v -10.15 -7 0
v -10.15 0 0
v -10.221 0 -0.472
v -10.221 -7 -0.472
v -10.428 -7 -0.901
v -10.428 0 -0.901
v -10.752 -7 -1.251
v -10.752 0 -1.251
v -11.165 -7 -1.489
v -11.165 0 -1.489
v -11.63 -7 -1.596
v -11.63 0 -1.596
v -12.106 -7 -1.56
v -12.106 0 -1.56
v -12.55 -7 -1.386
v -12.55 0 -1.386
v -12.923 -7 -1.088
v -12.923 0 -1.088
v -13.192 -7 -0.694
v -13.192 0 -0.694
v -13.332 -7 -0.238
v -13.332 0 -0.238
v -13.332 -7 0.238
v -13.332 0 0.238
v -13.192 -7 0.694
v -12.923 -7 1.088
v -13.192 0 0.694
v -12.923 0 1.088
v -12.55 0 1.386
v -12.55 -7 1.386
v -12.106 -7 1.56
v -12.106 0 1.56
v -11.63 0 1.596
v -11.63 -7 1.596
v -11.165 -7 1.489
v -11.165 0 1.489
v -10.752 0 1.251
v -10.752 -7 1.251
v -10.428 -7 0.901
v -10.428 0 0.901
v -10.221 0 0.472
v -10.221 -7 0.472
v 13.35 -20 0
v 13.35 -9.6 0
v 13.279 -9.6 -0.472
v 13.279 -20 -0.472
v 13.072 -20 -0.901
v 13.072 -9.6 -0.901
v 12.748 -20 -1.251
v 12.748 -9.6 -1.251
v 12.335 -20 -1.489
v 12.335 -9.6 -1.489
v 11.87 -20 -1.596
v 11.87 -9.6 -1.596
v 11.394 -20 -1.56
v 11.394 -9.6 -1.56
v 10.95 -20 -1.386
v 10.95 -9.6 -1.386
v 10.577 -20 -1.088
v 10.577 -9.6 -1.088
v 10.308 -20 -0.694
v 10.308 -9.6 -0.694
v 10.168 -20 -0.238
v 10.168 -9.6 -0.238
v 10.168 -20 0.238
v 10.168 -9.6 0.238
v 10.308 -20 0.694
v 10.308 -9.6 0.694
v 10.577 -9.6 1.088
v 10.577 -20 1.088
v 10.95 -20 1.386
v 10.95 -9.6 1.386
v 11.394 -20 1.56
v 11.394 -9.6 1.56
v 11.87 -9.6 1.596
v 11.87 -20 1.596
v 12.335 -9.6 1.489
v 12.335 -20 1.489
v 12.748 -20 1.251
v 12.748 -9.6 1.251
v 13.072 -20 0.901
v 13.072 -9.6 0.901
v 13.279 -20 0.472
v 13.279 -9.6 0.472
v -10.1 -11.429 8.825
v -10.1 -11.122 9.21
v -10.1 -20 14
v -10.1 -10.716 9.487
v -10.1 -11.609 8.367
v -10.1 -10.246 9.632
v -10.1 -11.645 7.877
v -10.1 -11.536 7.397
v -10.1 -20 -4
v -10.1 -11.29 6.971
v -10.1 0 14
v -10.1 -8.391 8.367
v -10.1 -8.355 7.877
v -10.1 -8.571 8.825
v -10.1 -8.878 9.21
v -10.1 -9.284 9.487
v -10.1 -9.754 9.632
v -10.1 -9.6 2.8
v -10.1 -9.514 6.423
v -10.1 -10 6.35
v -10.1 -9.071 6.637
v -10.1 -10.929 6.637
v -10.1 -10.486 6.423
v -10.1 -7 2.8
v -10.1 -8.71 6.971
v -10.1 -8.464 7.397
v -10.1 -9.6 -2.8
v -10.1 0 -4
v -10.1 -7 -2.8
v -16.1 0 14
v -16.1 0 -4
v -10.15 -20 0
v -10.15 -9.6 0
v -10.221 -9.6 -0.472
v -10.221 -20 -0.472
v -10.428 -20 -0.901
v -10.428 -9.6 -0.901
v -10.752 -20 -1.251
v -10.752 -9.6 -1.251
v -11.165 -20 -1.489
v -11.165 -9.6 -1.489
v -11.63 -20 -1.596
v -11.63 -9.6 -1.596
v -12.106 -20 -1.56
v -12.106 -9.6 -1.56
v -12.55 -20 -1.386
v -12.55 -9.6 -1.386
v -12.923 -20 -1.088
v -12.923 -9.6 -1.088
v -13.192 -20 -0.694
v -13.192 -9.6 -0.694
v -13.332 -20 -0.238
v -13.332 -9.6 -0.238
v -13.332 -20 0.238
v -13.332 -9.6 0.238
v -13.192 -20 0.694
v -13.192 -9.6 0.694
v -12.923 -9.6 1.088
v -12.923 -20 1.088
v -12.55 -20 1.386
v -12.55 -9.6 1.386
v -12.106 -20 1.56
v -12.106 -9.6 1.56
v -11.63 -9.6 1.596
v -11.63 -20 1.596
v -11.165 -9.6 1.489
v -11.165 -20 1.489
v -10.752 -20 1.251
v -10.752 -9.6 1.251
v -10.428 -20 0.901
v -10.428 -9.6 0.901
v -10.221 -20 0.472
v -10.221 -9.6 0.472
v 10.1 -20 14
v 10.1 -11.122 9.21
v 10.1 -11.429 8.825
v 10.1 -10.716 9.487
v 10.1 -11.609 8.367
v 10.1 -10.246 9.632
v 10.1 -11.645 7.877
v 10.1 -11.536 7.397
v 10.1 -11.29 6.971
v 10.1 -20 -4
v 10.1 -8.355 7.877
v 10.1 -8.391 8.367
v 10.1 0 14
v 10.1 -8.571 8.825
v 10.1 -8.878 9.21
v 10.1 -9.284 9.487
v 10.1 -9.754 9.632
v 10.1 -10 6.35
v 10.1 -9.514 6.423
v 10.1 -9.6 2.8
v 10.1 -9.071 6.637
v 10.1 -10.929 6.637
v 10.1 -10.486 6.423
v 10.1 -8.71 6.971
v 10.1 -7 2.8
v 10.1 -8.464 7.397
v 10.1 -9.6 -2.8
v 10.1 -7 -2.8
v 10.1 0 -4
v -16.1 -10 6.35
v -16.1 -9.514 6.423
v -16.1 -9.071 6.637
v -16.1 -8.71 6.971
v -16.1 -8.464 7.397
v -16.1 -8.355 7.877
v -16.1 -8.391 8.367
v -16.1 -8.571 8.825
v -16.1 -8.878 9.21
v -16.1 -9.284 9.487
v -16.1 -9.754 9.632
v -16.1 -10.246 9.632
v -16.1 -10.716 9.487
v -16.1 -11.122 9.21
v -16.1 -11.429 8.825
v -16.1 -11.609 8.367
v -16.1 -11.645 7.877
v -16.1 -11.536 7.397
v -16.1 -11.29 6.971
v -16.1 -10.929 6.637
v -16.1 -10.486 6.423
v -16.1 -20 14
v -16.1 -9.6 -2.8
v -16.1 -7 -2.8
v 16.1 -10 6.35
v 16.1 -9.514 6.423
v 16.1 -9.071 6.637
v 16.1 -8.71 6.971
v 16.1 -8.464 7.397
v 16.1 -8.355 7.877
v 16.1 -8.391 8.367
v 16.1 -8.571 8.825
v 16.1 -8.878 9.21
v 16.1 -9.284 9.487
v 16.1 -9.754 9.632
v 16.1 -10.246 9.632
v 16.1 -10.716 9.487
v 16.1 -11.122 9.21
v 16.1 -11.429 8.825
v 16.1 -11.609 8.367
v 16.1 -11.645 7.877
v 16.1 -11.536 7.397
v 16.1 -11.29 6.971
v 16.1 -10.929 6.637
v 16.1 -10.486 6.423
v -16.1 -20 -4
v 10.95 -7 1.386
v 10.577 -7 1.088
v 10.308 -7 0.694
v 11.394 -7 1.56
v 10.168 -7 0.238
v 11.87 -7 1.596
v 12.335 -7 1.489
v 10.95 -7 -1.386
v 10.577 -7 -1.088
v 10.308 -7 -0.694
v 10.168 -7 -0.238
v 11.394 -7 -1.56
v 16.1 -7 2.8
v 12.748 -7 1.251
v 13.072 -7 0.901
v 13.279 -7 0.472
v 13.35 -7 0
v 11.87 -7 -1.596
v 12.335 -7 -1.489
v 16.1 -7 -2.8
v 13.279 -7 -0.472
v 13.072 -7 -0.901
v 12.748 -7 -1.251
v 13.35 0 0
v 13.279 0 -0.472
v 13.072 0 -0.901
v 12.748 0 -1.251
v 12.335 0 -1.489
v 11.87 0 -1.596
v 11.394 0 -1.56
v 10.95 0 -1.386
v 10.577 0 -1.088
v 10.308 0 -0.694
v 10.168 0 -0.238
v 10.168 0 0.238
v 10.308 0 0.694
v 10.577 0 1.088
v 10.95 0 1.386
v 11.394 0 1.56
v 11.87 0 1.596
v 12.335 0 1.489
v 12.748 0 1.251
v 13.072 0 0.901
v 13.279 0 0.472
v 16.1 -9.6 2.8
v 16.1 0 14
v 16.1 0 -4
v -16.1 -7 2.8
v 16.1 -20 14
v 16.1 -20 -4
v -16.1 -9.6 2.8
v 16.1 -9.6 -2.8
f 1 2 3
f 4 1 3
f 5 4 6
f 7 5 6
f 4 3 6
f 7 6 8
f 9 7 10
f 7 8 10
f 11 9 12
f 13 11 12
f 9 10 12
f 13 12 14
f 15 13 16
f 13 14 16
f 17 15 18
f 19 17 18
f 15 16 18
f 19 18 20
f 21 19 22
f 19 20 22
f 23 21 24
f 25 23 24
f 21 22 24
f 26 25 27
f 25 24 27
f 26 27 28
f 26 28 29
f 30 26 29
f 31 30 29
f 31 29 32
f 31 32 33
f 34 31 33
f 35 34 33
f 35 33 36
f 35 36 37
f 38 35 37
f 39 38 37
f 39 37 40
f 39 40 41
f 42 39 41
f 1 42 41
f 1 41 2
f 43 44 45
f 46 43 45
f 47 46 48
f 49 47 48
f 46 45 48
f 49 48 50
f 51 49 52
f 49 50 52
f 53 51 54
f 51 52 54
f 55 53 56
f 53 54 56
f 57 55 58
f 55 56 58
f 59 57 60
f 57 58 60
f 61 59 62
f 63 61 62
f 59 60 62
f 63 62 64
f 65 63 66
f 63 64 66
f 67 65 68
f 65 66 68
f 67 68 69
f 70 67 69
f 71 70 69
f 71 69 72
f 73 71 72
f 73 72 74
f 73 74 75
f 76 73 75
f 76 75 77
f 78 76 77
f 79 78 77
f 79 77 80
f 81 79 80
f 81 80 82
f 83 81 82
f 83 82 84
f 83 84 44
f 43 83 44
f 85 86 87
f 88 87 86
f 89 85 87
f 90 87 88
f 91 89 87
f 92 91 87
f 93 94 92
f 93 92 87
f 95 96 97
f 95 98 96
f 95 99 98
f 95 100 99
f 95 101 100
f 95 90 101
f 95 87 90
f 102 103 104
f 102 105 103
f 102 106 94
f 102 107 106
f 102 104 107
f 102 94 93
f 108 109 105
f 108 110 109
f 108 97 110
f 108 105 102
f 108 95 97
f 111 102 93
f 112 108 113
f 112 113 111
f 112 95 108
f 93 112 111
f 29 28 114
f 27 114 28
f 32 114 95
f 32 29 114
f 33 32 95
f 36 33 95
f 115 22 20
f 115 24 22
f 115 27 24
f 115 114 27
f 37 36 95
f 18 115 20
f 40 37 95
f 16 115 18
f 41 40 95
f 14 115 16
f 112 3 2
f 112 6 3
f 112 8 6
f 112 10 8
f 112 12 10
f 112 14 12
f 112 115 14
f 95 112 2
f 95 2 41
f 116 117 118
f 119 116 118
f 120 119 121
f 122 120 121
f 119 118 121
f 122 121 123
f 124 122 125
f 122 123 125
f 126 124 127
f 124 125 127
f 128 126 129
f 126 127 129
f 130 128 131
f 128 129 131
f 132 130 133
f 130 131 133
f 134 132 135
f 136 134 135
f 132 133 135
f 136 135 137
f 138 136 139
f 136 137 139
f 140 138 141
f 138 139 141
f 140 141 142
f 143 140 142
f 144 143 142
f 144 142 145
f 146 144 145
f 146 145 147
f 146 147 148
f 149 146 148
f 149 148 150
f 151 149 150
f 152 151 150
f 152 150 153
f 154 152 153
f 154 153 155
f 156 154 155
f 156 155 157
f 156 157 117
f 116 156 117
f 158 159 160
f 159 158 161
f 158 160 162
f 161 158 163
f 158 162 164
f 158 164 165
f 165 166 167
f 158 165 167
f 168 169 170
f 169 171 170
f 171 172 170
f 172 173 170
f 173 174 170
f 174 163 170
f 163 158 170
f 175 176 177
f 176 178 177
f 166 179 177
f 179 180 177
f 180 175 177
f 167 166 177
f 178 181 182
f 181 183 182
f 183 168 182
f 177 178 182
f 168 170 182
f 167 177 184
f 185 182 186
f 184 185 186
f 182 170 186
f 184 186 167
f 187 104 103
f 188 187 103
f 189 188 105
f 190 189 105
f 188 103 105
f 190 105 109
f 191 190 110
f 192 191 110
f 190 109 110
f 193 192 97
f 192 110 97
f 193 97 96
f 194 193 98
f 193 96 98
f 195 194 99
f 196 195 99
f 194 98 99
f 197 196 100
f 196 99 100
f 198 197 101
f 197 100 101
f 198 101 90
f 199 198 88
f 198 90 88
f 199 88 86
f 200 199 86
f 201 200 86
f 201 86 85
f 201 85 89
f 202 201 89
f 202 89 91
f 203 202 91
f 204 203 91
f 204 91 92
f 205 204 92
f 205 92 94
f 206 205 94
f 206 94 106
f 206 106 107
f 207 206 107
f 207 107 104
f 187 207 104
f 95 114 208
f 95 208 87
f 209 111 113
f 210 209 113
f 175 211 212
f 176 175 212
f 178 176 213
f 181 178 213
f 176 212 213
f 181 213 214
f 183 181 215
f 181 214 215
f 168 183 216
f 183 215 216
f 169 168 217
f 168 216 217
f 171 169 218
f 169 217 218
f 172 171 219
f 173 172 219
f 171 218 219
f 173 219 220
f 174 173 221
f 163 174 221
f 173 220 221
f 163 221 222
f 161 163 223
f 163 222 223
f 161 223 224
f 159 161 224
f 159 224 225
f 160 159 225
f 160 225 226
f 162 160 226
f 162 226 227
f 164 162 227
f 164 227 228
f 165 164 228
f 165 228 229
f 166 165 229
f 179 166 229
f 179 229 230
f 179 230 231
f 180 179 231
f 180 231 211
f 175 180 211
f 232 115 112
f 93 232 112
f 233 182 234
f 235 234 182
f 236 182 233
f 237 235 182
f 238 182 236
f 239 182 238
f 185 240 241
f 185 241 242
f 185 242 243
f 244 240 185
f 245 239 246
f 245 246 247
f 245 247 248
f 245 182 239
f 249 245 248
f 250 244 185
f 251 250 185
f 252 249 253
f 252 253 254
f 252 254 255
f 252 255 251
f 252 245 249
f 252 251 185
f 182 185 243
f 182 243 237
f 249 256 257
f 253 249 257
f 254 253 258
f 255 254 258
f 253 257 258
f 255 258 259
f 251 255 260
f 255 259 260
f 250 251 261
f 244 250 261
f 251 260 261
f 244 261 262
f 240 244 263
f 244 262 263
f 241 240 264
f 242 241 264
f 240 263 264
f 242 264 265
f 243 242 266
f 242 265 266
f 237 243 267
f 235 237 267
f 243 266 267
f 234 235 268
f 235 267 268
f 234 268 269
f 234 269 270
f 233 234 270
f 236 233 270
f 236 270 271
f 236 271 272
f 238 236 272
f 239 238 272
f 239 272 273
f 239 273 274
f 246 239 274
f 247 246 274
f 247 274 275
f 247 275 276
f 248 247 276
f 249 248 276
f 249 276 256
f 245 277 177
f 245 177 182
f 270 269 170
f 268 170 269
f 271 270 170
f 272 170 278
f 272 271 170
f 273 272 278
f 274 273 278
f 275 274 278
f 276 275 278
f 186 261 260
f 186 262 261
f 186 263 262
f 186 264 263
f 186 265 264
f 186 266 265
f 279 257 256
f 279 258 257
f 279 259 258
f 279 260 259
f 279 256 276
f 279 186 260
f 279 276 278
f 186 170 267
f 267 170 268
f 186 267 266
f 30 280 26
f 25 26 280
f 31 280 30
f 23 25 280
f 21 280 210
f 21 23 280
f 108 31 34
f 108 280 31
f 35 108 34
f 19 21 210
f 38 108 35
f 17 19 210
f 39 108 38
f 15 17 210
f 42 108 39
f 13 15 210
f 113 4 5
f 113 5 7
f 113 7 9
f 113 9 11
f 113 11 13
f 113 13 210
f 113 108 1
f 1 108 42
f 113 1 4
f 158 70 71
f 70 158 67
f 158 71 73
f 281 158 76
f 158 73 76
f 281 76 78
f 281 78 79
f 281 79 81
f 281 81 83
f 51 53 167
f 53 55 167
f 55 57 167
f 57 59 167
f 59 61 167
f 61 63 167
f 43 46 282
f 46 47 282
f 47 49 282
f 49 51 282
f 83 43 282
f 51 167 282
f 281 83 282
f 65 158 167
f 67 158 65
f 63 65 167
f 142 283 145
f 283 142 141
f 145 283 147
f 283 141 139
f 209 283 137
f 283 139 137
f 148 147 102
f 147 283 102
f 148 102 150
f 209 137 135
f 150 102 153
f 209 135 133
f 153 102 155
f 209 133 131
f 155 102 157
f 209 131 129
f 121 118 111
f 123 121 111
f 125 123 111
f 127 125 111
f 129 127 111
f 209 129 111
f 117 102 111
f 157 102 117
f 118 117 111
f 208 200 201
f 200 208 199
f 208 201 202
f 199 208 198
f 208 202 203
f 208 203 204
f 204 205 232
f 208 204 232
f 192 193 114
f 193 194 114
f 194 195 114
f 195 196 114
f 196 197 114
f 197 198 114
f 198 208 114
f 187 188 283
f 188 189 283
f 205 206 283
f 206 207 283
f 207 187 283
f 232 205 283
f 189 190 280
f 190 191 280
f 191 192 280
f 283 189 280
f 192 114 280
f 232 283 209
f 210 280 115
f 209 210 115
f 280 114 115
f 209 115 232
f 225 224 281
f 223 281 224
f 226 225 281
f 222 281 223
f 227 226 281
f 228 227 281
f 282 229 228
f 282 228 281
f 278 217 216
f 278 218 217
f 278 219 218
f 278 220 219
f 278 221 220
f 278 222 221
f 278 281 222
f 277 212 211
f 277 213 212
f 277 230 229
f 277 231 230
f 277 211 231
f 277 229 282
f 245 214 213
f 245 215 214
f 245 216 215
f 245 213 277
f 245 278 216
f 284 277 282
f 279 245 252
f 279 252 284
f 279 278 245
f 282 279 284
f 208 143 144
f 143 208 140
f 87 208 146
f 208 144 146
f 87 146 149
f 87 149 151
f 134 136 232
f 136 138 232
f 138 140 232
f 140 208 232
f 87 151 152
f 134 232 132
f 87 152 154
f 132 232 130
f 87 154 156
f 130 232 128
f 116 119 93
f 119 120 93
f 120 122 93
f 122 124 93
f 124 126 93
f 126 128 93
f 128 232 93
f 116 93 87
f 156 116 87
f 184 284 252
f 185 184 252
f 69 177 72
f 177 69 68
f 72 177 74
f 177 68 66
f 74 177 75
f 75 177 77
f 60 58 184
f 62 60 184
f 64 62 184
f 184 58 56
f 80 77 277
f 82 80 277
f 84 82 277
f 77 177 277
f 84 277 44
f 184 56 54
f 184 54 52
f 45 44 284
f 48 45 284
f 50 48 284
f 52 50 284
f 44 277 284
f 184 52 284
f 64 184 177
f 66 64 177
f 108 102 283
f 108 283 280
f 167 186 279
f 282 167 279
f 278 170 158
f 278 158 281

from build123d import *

# Parameters (mm, degrees)
SKETCH_1_W          = 6
SKETCH_1_H          = 18
SKETCH_1_R          = 1.6
EXTRUDE_1_DEPTH     = 20
EXTRUDE_1_2_DEPTH   = 20
SKETCH_2_R          = 1.65
SKETCH_2_W          = 5.6
SKETCH_2_H          = 2.6
CUT_EXTRUDE_1_DEPTH = 33.2


with BuildPart() as part:
    # 草图1 → 凸台-拉伸1 (new body)
    with BuildSketch(Plane(origin=(0, 0, 0), x_dir=(1, 0, 0), z_dir=(0, 1, 0))):
        with Locations((-13.1, -5)):
            Rectangle(SKETCH_1_W, SKETCH_1_H)
        with Locations((-11.75, 0)):
            Circle(SKETCH_1_R, mode=Mode.SUBTRACT)
    extrude(amount=-EXTRUDE_1_DEPTH)


with BuildPart() as body_2:
    # 草图1 → Extrude 1 2 (new body)
    with BuildSketch(Plane(origin=(0, 0, 0), x_dir=(1, 0, 0), z_dir=(0, 1, 0))):
        with Locations((13.1, -5)):
            Rectangle(SKETCH_1_W, SKETCH_1_H)
        with Locations((11.75, 0)):
            Circle(SKETCH_1_R, mode=Mode.SUBTRACT)
    extrude(amount=-EXTRUDE_1_2_DEPTH)


with BuildPart() as cut_extrude_1_tool:
    # 草图2 → 切除-拉伸1 (new body, through all)
    with BuildSketch(Plane(origin=(16.1, 0, 0), x_dir=(0, 0, -1), z_dir=(1, 0, 0))):
        with Locations((-8, -10)):
            Circle(SKETCH_2_R)
        with Locations((0, -8.3)):
            Rectangle(SKETCH_2_W, SKETCH_2_H)
    extrude(amount=-CUT_EXTRUDE_1_DEPTH)


with BuildPart() as part_1:
    add(part.part)

    # 切除-拉伸1: cut by cut_extrude_1_tool
    add(cut_extrude_1_tool.part, mode=Mode.SUBTRACT)


with BuildPart() as body_2_1:
    add(body_2.part)

    # 切除-拉伸1: cut by cut_extrude_1_tool
    add(cut_extrude_1_tool.part, mode=Mode.SUBTRACT)


solid = Compound([part_1.part, body_2_1.part])
